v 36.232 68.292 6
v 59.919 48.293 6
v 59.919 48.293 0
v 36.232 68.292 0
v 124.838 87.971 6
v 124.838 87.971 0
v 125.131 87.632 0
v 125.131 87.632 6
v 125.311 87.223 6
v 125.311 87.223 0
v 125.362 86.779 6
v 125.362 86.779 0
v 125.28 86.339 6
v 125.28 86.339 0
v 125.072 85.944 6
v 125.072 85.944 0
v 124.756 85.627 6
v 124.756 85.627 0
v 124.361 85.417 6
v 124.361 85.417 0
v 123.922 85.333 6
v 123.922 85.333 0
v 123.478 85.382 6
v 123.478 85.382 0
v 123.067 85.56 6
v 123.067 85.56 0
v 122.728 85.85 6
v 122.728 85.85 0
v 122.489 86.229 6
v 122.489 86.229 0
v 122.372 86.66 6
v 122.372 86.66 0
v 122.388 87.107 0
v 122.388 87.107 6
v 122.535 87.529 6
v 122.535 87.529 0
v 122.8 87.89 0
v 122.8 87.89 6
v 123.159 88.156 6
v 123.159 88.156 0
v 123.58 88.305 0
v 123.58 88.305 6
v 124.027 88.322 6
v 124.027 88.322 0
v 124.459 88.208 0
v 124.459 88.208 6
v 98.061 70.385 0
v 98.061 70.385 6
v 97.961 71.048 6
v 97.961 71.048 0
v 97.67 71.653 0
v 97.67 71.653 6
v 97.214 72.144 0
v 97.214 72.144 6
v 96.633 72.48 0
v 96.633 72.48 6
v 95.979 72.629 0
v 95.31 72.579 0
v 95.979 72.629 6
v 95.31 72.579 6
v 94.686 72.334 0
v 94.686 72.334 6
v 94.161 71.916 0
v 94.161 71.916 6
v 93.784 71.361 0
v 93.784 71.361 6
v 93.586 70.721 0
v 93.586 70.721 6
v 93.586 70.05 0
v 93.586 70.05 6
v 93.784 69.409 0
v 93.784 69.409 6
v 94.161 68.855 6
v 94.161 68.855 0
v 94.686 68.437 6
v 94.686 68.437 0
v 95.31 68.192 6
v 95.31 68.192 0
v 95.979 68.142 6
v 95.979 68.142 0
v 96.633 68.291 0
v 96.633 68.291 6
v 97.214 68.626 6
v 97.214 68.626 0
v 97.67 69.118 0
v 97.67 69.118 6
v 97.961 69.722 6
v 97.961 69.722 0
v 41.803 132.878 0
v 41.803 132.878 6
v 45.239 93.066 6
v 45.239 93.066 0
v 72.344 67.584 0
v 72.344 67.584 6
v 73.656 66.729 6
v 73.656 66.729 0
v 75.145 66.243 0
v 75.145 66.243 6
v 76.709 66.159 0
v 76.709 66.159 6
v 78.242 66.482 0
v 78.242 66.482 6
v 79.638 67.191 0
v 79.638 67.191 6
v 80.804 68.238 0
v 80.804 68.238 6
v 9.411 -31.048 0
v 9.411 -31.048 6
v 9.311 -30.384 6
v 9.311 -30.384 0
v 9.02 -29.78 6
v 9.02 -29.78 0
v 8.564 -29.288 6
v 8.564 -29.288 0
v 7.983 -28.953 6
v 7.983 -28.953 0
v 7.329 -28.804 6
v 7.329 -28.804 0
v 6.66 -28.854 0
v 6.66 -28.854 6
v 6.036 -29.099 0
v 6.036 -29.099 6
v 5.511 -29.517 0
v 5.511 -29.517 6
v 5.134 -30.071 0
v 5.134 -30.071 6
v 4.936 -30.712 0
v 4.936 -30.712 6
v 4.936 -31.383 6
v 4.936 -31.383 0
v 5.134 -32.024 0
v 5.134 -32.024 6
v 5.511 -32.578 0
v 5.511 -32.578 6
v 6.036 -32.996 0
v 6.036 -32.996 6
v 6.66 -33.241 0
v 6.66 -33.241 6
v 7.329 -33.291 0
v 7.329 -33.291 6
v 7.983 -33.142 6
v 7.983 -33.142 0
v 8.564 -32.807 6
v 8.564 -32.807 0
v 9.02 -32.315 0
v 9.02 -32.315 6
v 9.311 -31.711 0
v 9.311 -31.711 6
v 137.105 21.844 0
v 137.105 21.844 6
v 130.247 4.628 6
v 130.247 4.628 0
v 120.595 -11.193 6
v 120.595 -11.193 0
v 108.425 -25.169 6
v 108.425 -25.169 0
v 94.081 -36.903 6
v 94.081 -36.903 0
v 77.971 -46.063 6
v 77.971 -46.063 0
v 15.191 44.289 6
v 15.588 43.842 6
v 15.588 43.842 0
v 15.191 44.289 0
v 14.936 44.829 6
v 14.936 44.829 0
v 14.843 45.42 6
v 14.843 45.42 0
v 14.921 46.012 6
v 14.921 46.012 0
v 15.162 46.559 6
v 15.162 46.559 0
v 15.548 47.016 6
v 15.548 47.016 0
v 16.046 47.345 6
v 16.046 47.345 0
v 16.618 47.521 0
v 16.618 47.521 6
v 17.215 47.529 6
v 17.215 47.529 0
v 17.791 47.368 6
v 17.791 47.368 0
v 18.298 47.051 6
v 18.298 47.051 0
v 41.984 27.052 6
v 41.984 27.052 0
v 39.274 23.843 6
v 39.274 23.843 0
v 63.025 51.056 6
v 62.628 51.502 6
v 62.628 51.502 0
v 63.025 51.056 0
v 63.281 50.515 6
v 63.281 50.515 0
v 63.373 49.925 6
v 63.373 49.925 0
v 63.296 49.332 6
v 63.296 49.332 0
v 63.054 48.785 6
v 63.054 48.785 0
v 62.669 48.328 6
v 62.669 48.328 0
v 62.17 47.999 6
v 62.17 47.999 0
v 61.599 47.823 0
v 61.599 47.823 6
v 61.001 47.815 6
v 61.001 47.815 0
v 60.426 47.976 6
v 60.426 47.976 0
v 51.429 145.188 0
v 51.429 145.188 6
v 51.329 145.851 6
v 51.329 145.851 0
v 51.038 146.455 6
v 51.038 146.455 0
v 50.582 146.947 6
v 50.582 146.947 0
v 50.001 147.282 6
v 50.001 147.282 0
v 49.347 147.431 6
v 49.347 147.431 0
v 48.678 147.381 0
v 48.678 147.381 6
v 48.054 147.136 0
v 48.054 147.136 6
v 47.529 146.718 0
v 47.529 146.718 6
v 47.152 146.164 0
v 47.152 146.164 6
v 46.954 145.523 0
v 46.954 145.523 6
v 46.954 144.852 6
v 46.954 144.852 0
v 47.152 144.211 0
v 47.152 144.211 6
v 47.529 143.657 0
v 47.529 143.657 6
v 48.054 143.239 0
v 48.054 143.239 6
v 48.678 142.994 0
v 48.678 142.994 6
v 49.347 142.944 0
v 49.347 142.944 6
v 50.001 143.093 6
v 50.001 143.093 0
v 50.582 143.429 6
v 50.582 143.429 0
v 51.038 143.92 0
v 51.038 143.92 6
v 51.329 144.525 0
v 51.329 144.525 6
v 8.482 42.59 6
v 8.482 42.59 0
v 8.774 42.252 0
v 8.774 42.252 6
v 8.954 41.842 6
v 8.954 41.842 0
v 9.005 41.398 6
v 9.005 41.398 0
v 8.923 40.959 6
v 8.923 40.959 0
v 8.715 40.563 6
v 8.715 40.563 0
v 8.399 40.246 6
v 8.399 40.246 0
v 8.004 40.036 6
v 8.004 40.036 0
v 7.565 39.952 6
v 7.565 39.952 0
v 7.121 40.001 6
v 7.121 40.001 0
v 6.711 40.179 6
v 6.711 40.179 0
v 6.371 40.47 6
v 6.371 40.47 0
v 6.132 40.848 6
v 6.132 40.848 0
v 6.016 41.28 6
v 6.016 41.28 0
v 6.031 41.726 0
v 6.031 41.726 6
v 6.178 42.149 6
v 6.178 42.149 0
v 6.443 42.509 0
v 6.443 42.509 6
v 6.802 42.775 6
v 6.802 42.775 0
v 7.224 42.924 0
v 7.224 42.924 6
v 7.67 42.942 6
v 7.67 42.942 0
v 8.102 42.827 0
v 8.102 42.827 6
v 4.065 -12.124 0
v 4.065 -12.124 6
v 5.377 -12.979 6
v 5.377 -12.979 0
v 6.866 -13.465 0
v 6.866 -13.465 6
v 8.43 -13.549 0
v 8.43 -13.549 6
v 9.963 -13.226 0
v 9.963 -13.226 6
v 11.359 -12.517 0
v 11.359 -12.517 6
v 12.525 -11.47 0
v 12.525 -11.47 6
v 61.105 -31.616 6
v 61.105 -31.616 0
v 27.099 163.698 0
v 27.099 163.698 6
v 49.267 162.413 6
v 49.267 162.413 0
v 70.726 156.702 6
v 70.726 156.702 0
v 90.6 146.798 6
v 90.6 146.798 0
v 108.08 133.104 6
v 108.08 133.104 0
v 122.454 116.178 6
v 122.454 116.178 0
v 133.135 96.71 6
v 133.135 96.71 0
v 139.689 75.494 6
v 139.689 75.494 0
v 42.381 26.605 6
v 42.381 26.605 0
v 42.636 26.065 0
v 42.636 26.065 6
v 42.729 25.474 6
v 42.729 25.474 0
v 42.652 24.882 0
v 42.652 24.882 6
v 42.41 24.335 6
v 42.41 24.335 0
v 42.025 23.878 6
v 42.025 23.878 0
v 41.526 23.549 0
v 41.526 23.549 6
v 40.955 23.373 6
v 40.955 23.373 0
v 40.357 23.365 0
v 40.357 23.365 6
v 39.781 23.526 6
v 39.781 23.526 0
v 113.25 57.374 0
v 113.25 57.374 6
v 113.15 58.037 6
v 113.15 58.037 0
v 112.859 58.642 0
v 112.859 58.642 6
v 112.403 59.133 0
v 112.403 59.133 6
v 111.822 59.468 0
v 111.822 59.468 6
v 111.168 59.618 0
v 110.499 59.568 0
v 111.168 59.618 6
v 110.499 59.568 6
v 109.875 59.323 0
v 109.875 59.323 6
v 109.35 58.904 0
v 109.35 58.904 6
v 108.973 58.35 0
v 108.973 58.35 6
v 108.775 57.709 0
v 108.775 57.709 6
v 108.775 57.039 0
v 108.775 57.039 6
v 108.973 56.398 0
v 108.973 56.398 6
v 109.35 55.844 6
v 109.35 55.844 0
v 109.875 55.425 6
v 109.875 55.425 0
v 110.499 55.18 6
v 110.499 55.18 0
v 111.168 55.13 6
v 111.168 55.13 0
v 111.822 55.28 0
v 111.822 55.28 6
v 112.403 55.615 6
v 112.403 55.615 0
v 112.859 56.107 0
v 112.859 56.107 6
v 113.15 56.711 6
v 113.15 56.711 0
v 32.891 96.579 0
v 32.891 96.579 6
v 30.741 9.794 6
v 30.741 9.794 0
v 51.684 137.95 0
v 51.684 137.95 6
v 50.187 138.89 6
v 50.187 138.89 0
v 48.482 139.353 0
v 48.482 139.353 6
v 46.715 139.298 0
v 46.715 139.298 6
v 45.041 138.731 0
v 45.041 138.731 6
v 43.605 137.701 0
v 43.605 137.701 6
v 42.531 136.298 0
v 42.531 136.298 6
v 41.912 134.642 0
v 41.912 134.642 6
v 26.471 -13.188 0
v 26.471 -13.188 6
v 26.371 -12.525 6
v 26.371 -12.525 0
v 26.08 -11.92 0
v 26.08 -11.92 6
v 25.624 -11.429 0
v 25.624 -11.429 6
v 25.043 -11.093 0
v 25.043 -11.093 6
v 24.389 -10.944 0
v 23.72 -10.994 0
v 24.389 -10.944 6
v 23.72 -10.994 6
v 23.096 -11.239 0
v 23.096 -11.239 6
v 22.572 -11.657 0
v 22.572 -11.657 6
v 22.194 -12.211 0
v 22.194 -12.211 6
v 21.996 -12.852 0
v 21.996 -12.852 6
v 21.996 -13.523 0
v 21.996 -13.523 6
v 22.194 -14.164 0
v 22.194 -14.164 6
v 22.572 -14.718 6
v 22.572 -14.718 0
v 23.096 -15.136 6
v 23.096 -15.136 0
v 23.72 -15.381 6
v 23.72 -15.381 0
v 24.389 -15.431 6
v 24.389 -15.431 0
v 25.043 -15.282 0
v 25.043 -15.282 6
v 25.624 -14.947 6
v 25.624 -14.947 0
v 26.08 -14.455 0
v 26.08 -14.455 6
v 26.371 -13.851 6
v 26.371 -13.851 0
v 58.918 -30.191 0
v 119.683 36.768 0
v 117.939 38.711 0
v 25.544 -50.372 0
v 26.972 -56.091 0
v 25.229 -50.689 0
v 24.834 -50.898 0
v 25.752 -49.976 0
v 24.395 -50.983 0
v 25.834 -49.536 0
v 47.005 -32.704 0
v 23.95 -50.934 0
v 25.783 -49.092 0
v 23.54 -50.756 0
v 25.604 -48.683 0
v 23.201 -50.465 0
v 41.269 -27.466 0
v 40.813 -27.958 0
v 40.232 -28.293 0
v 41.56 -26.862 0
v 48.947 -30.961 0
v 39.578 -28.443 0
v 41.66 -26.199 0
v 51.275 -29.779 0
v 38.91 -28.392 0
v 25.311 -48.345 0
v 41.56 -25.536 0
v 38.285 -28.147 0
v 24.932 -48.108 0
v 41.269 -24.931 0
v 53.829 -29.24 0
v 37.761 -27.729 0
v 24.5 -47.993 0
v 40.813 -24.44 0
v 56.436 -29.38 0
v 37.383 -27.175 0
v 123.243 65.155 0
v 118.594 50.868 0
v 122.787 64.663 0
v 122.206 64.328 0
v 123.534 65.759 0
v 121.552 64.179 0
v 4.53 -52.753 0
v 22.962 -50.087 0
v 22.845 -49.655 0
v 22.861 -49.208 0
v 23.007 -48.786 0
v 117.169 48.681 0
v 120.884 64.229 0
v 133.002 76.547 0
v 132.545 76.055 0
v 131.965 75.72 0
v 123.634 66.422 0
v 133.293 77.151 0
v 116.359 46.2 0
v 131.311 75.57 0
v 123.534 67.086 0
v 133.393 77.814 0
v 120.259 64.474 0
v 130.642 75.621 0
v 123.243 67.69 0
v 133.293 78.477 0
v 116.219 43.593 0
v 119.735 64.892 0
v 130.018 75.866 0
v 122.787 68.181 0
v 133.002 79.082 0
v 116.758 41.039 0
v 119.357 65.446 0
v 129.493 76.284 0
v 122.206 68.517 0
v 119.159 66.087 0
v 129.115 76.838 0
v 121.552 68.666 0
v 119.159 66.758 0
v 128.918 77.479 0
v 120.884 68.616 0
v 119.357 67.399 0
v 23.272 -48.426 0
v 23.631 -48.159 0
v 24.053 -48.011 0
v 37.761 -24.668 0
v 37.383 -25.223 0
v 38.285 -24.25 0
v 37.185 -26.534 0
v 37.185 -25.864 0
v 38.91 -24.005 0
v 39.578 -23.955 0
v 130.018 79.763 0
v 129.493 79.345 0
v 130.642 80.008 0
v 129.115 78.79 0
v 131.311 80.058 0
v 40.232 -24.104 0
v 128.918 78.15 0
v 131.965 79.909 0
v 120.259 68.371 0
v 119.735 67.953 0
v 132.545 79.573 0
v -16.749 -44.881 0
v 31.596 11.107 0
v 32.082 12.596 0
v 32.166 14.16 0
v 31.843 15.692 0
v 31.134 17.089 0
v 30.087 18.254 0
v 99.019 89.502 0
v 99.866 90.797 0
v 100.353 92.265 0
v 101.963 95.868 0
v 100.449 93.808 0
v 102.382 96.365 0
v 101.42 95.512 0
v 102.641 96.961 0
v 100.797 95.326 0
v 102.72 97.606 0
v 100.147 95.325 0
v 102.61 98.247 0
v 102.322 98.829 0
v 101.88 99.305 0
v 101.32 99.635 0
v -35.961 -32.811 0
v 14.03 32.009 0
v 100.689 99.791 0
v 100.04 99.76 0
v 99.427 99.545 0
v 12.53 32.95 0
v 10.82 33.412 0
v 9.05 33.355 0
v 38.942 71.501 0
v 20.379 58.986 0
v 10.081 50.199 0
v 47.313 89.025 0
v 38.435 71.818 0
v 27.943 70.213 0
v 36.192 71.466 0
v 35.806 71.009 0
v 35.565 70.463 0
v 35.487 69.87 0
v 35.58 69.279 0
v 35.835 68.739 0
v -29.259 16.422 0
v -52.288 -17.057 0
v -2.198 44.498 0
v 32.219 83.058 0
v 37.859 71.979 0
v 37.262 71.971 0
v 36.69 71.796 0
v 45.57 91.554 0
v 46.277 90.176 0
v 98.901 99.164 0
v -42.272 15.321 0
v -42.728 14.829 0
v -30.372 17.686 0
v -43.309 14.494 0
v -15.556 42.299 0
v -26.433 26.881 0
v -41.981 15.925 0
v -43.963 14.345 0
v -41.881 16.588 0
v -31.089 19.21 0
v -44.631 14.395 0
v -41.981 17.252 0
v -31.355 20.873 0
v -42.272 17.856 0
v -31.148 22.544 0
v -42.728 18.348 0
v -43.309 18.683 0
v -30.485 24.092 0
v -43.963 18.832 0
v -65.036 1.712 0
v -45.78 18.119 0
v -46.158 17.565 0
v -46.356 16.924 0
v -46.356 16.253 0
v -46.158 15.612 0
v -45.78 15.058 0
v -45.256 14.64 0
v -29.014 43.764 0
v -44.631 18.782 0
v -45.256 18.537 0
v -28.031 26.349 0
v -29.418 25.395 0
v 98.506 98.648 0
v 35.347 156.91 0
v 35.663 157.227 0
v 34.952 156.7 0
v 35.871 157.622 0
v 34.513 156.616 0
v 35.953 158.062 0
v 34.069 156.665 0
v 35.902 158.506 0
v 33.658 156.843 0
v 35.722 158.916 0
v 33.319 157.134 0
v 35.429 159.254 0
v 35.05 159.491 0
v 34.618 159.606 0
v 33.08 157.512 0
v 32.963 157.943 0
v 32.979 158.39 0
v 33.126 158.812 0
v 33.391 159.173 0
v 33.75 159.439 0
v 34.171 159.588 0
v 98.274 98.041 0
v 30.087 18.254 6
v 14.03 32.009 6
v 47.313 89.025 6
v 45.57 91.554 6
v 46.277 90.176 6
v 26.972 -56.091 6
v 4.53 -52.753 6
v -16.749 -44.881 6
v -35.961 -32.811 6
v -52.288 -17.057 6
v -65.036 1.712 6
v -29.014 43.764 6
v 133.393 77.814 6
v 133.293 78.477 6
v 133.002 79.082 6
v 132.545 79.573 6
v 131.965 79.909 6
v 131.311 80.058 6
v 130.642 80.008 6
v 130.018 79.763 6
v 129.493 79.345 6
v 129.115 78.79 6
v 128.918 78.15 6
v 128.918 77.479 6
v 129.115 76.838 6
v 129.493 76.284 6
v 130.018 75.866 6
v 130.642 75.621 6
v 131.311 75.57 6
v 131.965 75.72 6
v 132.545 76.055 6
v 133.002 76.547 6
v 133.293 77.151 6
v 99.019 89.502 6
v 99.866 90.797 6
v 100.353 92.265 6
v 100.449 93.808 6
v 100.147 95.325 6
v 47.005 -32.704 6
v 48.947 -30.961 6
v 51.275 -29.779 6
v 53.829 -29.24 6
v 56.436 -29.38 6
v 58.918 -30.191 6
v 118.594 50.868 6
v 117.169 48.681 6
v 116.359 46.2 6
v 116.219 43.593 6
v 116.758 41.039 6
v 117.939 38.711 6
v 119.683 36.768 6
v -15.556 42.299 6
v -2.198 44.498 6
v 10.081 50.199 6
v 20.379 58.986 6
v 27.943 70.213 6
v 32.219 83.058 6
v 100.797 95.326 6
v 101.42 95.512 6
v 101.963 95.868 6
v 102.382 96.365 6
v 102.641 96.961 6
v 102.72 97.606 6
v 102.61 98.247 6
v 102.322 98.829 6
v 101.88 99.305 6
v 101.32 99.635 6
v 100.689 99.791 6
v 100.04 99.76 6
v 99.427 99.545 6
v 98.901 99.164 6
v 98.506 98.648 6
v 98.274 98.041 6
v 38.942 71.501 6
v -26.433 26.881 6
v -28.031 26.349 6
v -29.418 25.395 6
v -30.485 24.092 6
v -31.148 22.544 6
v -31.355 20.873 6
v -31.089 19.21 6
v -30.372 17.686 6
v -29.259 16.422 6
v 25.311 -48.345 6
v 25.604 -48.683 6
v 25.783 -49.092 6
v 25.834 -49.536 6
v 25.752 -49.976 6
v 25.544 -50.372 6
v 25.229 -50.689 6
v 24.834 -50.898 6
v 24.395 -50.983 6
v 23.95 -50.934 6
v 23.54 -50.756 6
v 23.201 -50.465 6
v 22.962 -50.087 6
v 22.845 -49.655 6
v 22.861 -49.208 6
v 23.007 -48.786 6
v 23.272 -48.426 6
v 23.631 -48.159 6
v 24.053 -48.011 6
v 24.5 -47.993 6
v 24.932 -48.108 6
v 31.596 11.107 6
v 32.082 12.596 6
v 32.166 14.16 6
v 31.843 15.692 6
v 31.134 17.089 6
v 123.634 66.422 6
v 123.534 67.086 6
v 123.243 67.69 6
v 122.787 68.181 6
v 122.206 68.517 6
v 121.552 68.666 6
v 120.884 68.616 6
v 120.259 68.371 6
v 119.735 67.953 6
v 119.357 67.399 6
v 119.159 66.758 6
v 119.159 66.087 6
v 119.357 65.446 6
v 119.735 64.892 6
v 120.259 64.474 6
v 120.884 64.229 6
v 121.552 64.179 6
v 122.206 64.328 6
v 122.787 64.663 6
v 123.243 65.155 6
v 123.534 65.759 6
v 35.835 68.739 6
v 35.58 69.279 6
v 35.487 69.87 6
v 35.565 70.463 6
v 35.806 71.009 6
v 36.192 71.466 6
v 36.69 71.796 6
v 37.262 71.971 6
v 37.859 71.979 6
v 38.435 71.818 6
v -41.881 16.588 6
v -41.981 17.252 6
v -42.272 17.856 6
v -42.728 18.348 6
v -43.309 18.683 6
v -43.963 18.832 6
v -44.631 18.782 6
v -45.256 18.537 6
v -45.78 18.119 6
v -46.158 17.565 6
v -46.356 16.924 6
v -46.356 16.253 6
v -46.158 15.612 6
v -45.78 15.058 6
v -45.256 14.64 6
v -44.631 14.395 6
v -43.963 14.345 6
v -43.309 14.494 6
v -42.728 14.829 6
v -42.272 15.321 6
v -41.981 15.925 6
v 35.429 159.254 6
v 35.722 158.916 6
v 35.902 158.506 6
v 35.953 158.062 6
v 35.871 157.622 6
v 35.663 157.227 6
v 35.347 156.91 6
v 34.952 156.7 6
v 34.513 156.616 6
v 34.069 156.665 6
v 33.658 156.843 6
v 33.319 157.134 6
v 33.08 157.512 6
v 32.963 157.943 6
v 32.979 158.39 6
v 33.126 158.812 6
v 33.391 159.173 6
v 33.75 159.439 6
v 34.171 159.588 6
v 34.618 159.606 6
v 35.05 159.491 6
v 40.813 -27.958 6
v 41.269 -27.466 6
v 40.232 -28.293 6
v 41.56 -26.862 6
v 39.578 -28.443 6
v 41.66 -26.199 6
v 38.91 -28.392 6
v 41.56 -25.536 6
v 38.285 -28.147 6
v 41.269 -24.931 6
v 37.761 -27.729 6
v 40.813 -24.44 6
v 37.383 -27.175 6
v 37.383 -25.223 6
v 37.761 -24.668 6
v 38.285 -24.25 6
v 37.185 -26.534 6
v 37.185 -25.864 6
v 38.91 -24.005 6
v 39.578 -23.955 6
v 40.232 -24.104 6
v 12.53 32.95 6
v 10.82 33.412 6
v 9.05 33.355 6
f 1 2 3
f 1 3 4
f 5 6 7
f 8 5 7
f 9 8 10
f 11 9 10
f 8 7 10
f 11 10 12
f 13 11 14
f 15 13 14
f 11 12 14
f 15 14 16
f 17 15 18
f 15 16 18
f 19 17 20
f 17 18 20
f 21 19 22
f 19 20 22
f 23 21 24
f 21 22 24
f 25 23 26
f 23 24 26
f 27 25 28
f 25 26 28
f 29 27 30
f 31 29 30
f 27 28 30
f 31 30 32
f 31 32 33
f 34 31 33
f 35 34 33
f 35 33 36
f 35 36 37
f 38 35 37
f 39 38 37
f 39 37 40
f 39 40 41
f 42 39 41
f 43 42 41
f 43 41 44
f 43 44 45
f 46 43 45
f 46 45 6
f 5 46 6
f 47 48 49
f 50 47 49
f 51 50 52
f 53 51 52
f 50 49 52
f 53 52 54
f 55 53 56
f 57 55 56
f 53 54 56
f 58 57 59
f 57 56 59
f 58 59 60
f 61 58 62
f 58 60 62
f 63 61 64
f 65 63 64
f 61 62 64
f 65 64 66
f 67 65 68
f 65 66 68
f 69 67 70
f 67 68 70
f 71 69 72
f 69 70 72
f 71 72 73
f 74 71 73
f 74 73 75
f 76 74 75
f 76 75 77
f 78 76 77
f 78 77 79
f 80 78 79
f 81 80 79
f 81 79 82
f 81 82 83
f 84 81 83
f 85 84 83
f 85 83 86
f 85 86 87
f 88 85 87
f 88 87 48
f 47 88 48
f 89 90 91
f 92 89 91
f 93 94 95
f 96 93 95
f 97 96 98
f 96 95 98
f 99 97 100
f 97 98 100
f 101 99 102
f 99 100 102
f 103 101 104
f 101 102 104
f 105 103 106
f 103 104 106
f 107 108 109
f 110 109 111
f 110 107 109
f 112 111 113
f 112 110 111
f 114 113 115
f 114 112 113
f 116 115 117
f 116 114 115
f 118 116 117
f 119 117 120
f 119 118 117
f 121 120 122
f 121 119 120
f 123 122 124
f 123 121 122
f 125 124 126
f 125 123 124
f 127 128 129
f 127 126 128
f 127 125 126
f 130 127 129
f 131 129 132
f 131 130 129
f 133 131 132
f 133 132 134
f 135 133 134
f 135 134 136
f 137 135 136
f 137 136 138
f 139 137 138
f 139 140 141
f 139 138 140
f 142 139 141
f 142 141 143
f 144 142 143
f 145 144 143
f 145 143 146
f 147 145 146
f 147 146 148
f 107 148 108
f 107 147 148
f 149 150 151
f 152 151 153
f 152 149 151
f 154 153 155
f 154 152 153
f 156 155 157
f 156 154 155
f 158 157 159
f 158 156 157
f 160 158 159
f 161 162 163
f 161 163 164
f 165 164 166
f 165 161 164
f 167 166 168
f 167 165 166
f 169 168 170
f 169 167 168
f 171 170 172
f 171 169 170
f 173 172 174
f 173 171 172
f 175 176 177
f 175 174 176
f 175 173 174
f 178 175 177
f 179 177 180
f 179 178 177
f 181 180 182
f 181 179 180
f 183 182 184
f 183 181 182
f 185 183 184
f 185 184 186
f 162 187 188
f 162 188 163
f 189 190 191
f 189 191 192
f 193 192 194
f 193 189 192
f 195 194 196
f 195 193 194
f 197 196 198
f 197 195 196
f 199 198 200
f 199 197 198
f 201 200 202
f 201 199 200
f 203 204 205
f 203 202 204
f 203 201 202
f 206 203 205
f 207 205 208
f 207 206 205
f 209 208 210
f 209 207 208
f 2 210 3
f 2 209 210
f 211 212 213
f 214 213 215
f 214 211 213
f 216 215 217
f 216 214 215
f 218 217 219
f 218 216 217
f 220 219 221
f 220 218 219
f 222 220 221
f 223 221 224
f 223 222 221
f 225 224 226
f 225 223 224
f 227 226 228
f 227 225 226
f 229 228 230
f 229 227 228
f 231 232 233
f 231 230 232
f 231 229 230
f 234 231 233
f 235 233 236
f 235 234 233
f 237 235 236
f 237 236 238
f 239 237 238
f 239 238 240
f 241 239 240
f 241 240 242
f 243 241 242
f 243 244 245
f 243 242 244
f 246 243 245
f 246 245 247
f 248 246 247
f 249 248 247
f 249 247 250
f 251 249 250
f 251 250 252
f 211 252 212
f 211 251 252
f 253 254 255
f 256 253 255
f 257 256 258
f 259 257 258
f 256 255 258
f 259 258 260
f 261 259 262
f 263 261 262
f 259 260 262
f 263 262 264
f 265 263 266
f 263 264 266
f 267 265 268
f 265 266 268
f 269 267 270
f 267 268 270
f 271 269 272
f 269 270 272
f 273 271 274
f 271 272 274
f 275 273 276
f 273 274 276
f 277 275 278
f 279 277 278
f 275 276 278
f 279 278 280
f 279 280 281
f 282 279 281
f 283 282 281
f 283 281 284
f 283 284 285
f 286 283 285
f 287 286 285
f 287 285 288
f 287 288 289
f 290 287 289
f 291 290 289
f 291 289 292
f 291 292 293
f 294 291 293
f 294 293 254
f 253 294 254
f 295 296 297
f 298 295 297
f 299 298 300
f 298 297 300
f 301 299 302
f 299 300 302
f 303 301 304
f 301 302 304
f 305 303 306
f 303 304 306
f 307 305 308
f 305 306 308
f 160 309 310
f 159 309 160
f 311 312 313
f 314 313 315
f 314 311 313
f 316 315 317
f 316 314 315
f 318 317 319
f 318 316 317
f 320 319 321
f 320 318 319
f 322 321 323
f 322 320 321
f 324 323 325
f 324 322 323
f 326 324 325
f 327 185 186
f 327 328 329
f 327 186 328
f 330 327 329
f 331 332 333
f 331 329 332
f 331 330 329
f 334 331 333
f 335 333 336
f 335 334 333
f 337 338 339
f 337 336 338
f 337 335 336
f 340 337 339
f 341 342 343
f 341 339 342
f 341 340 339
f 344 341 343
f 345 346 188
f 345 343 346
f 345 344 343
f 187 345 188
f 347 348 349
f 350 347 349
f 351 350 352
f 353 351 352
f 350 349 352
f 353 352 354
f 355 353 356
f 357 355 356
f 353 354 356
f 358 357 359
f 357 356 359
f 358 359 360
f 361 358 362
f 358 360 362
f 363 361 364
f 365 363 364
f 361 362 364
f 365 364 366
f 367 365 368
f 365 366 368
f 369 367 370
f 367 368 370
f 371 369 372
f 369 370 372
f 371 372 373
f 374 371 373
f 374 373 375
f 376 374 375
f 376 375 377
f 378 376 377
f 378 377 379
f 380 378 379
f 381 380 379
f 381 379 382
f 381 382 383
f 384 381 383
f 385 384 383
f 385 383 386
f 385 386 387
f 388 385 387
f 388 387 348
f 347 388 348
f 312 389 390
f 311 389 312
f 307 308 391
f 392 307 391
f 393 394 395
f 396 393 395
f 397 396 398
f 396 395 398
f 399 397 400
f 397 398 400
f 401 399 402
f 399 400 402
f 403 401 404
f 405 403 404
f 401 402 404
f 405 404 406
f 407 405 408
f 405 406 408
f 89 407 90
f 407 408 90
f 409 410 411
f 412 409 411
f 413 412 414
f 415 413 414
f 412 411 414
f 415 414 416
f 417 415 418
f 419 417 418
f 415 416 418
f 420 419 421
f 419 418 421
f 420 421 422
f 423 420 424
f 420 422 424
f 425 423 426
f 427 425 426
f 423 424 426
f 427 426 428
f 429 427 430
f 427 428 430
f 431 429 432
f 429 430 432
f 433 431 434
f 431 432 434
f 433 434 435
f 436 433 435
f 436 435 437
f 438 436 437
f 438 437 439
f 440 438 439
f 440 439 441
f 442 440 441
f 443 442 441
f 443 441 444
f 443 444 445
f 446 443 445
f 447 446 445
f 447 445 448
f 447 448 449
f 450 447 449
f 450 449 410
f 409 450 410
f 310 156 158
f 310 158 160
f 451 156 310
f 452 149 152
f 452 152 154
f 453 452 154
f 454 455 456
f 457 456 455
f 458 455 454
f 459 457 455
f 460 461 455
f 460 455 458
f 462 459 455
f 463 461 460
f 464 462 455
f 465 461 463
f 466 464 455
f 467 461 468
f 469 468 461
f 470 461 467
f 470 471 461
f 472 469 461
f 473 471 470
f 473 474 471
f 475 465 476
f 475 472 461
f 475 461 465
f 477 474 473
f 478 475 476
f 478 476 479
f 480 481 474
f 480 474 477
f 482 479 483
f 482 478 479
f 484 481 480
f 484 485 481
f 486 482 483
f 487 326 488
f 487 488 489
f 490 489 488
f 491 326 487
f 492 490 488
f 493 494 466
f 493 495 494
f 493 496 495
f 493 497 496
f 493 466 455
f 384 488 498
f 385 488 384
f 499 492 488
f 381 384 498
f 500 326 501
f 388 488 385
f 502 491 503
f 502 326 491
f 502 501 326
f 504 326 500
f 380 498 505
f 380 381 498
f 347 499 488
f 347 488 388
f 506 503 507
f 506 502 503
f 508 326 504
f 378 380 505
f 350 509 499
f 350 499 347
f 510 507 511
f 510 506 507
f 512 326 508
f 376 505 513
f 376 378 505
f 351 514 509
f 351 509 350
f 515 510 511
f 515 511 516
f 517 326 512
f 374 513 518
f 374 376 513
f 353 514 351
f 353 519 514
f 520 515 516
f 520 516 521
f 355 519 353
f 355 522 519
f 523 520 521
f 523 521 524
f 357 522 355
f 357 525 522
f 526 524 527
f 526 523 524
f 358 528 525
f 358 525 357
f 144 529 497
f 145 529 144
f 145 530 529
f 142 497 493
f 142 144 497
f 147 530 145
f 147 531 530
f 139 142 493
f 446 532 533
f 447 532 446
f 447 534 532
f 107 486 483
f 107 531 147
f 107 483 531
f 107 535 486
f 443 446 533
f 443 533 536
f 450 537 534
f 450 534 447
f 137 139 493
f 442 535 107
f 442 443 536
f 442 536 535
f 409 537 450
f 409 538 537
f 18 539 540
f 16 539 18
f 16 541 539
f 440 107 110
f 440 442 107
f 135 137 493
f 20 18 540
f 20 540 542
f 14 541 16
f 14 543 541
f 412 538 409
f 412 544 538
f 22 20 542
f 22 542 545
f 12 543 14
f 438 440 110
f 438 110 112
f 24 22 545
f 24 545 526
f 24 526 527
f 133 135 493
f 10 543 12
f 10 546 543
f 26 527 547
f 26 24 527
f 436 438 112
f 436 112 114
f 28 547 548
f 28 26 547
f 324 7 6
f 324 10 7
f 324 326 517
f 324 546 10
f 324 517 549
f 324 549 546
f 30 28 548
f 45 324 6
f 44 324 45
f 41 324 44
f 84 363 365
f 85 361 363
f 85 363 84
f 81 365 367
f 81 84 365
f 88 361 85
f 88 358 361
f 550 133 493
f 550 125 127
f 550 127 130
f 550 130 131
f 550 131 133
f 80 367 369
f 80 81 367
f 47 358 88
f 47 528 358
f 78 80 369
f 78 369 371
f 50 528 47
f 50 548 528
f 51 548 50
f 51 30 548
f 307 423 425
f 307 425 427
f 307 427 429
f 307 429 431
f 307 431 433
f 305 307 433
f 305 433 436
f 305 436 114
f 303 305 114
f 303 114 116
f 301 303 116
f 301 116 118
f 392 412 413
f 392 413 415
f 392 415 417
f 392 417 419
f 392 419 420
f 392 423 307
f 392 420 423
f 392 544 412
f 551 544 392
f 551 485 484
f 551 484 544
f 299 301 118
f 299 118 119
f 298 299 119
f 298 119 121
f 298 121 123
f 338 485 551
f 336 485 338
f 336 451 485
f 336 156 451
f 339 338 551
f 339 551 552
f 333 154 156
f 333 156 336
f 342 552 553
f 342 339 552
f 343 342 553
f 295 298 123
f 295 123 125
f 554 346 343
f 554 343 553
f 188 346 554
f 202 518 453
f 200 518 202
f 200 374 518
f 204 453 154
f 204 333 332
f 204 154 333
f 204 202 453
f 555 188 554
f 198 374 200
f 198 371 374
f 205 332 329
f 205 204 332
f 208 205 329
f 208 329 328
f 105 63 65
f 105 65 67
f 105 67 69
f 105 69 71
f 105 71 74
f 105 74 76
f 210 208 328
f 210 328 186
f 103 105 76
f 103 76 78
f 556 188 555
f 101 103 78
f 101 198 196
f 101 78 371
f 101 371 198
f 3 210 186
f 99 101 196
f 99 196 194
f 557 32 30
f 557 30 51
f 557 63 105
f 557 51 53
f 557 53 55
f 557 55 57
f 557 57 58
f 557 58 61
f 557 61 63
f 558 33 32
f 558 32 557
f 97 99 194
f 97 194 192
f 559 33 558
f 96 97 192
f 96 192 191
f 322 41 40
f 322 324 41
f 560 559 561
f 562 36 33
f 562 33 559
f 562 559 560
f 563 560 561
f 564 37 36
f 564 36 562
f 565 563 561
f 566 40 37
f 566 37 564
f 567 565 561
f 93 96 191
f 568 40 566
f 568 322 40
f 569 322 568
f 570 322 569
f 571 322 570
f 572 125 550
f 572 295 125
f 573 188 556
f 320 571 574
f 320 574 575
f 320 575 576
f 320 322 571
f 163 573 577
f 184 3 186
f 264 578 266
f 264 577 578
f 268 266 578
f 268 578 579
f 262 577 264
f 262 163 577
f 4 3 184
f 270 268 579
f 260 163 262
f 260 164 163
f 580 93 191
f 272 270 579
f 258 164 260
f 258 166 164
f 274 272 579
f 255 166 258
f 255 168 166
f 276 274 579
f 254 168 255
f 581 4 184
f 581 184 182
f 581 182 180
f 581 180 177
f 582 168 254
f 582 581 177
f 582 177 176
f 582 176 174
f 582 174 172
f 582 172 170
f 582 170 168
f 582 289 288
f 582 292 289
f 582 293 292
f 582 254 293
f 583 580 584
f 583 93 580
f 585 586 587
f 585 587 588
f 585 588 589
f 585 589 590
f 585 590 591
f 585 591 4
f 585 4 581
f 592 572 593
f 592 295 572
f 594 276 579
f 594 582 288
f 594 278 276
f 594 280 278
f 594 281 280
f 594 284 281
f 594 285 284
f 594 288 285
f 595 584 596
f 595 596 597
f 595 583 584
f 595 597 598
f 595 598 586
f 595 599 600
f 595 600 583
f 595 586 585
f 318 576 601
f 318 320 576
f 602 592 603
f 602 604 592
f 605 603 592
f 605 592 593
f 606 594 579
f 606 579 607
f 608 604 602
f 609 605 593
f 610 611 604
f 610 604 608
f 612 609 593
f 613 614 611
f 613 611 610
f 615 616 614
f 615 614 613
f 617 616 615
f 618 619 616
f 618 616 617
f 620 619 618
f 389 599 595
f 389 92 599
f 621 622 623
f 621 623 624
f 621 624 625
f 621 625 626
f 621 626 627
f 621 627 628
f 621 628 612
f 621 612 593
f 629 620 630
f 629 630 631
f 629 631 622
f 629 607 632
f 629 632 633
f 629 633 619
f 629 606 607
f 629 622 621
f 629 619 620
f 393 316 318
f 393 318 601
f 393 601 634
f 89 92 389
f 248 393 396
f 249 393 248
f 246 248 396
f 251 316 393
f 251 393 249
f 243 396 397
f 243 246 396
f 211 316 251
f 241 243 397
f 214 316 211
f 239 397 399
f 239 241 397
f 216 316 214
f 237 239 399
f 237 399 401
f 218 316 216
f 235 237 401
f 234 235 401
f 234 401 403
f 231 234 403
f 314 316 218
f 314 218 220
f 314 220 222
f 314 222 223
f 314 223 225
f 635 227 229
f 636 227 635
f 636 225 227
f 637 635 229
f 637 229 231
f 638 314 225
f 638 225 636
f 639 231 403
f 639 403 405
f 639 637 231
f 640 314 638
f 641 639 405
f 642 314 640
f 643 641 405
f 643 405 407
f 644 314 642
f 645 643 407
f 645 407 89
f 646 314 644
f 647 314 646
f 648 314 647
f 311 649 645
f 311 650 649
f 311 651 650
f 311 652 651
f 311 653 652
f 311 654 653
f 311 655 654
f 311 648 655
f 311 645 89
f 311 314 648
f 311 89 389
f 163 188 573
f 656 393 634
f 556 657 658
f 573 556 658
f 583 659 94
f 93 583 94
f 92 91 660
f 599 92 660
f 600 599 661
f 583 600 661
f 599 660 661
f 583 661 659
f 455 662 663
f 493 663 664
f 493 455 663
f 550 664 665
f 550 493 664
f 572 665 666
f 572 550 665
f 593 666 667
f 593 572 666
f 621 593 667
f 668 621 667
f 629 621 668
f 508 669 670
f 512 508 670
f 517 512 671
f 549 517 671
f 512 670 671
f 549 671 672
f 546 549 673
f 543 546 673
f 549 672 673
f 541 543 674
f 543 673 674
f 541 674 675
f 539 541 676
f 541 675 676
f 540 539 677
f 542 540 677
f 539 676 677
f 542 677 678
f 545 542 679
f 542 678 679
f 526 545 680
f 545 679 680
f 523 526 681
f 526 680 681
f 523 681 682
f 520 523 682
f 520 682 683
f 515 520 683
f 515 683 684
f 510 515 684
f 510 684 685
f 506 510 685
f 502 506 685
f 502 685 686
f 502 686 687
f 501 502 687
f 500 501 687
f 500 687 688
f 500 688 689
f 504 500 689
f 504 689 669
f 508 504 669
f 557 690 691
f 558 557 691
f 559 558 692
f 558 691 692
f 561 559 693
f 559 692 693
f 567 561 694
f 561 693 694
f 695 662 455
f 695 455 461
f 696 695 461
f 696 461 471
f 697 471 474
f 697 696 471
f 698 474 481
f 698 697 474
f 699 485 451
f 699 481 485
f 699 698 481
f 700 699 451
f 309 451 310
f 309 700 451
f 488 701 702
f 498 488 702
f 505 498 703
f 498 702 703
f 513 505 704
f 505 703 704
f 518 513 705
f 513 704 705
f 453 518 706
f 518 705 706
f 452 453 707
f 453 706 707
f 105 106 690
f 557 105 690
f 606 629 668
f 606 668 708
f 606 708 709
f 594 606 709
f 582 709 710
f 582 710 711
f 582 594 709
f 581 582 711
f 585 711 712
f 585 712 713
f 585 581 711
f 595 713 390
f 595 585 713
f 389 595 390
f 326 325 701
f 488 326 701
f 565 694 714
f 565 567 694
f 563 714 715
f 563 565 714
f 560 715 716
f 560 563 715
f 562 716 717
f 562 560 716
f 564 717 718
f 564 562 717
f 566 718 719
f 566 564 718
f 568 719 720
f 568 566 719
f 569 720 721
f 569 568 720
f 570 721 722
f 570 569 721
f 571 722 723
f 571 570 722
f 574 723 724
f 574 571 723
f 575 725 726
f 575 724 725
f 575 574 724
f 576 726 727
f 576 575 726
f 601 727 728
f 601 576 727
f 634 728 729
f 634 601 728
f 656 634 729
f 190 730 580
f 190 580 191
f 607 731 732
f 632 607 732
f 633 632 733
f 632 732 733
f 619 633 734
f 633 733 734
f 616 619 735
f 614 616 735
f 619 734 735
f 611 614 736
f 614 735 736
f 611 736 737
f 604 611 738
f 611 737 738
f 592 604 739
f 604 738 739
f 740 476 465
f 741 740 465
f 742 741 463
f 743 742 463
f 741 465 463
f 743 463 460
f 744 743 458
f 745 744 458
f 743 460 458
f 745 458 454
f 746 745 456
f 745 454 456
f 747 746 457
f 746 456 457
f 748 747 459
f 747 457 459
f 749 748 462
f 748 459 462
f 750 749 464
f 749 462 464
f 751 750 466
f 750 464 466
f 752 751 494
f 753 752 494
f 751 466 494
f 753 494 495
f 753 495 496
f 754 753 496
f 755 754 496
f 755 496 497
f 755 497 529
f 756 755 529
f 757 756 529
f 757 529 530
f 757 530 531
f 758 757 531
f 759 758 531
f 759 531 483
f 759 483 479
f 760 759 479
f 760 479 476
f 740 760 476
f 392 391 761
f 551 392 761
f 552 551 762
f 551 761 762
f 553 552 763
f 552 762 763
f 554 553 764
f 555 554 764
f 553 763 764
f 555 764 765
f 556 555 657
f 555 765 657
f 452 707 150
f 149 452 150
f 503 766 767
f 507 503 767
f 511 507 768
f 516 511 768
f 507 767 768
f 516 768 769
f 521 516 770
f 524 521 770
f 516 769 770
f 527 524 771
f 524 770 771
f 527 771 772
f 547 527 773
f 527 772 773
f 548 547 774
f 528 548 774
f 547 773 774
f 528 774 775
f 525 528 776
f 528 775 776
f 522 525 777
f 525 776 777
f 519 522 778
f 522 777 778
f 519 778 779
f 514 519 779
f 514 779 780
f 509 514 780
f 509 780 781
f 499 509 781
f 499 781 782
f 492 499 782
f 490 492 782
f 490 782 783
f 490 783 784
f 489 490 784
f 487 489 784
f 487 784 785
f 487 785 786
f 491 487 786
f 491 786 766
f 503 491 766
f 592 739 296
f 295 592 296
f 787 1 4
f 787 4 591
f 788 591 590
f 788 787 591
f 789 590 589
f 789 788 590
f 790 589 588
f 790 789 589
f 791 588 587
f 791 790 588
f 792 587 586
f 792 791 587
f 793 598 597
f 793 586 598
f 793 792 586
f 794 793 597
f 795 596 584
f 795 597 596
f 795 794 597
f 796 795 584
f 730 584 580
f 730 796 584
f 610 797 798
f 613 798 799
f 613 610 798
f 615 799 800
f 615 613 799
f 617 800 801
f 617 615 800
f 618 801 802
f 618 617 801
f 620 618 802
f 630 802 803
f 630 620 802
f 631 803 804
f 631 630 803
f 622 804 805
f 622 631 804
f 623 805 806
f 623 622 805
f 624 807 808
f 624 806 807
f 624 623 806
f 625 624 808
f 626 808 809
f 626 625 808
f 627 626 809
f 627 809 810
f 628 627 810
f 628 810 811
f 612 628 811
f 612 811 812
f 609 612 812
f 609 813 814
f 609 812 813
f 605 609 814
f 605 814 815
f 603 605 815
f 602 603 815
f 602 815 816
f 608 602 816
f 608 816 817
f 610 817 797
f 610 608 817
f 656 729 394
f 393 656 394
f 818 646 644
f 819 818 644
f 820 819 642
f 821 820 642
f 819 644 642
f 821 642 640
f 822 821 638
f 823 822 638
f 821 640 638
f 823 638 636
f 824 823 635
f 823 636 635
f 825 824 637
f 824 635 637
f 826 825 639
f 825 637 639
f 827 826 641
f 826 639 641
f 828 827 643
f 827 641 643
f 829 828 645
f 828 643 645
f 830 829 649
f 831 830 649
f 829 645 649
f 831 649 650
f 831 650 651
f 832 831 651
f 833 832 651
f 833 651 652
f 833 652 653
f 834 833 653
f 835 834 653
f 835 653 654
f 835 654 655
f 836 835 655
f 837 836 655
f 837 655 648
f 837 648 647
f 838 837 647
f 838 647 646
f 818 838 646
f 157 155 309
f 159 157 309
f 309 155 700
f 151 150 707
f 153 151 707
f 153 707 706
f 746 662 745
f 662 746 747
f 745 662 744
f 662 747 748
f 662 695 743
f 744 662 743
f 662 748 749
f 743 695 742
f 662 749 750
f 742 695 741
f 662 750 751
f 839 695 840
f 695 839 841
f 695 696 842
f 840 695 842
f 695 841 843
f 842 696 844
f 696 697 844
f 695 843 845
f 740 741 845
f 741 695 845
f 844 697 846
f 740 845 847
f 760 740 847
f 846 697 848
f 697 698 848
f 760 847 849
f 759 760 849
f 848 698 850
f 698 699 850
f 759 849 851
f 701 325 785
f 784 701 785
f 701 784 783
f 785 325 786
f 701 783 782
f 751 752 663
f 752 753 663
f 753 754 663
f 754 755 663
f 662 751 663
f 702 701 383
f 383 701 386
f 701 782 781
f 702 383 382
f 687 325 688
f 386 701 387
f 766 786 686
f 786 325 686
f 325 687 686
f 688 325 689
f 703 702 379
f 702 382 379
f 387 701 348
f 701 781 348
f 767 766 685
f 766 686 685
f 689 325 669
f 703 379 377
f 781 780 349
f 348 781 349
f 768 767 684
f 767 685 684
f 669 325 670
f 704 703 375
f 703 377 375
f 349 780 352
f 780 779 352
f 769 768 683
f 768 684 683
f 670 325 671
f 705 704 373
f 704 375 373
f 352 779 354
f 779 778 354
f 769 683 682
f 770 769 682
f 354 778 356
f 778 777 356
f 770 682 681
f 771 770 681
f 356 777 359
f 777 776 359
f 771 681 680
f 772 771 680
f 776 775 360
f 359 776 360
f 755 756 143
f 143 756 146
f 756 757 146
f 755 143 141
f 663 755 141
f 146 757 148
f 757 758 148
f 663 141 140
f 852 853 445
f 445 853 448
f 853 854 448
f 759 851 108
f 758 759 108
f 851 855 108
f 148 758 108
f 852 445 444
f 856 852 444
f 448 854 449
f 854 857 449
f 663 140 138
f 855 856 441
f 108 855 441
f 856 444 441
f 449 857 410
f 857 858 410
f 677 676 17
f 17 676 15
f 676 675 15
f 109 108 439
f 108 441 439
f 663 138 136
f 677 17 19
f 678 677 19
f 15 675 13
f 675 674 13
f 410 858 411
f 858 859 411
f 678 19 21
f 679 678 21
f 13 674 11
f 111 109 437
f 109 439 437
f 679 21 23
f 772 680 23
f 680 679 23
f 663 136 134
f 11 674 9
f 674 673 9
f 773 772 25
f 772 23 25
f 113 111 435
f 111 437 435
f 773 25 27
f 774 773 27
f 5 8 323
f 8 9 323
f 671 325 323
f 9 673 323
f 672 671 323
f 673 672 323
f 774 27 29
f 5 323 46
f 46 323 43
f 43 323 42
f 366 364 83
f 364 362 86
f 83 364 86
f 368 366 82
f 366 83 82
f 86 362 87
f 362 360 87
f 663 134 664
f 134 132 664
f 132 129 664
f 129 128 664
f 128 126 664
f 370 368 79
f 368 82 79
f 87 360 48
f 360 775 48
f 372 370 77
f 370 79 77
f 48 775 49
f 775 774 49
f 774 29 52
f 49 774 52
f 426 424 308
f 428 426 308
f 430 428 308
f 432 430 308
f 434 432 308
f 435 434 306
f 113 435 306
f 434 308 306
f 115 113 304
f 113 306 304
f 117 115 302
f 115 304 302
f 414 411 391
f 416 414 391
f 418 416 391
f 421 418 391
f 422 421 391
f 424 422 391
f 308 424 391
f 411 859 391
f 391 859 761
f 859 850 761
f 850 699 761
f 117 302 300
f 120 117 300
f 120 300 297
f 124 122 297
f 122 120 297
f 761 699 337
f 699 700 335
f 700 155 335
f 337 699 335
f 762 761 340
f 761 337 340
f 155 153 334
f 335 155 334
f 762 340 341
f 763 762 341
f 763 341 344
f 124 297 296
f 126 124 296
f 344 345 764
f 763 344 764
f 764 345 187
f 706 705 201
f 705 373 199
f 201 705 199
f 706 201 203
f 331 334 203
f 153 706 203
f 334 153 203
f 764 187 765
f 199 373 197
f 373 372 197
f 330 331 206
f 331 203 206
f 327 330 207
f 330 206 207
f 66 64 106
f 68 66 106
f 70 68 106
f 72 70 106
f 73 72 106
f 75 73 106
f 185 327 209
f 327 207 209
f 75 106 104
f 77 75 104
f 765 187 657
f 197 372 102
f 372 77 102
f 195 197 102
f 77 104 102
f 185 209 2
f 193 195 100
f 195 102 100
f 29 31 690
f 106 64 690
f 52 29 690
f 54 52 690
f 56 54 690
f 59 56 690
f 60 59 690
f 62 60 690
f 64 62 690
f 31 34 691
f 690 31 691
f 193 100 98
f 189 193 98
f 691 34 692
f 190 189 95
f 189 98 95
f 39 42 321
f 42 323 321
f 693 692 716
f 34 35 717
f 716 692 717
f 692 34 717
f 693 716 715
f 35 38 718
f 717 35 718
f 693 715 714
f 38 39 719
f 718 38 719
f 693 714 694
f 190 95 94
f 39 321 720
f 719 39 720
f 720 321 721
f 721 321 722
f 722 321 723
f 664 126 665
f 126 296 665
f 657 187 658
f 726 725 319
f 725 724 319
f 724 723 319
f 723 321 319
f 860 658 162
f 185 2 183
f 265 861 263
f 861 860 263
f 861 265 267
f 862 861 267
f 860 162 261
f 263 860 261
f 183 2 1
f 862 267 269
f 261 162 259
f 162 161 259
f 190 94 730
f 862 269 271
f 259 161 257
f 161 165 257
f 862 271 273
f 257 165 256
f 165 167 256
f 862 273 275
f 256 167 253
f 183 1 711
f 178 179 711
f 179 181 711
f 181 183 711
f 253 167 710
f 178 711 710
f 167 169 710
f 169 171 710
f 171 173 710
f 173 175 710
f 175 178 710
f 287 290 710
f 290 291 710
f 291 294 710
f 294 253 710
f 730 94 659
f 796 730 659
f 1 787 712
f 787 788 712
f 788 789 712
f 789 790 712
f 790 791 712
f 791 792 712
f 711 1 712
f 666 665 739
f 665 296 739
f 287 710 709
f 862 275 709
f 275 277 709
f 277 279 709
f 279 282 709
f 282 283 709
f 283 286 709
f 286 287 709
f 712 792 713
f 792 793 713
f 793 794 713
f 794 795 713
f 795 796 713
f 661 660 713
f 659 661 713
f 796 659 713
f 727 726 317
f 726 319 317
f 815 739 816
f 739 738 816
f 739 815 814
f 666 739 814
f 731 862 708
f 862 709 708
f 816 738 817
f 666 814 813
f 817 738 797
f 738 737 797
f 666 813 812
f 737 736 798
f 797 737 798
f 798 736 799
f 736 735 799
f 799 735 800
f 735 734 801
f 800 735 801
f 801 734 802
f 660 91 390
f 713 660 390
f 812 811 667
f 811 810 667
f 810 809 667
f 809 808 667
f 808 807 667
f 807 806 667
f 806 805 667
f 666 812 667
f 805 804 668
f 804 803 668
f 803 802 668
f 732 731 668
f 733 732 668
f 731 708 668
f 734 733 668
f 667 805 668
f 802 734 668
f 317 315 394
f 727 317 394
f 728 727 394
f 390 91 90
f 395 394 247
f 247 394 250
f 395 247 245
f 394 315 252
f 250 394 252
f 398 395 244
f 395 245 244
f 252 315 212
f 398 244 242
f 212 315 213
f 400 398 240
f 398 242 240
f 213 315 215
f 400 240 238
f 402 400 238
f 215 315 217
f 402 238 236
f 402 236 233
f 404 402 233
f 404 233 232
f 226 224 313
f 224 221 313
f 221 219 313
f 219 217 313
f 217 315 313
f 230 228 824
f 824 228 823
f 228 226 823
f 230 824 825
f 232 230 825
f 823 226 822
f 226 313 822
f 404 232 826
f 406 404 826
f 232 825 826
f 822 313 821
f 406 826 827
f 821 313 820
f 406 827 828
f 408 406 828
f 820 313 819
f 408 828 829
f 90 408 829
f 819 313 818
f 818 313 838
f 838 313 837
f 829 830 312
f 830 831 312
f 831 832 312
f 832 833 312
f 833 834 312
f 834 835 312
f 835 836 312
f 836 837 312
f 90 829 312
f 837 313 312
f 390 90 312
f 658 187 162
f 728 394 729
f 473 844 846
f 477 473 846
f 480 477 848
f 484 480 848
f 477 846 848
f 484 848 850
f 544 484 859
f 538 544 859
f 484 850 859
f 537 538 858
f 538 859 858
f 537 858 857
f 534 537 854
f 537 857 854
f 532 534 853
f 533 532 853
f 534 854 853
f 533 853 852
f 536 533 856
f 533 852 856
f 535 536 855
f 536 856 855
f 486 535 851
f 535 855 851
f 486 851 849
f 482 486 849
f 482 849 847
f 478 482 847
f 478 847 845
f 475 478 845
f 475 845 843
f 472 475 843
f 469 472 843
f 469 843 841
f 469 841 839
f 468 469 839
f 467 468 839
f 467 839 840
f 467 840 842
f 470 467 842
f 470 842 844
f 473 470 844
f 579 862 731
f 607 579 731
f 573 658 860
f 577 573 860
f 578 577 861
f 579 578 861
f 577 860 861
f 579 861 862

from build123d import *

# Parameters (mm, degrees)
SKETCH1_R                     = 2.25
BOSS_EXTRUDE1_DEPTH           = 6
CUT_EXTRUDE1_DEPTH            = 10
F_4_5_4_5_DIAMETER_HOLE_D     = 4.5
F_4_5_4_5_DIAMETER_HOLE_DEPTH = 10
F_4_5_4_5_DIAMETER_HOLE_TIP   = 1.351936393
F_3_0MM_DOWEL_HOLE1_D         = 3
SKETCH7_R                     = 2.25
CUT_EXTRUDE2_DEPTH            = 10


with BuildPart() as part:
    # Sketch1 → Boss-Extrude1 (new body)
    with BuildSketch(Plane.XY):
        with BuildLine():
            Line((-65.035663909, 1.711915541), (-29.013741643, 43.763540838))
            ThreePointArc((-29.013741643, 43.763540838), (15.528638553, 54.242344325), (32.891210702, 96.578735816))
            Line((32.891210702, 96.578735816), (27.09893981, 163.698257544))
            ThreePointArc((27.09893981, 163.698257544), (127.465162664, -0.583384595), (-65.035663909, 1.711915541))
        make_face()
        with Locations((-44.130722543, 16.588386381)):
            Circle(SKETCH1_R, mode=Mode.SUBTRACT)
        with Locations((7.160790579, -31.047531597)):
            Circle(SKETCH1_R, mode=Mode.SUBTRACT)
        with Locations((100.470270724, 97.551800763)):
            Circle(SKETCH1_R, mode=Mode.SUBTRACT)
        with Locations((49.178757602, 145.187718741)):
            Circle(SKETCH1_R, mode=Mode.SUBTRACT)
    extrude(amount=BOSS_EXTRUDE1_DEPTH)

    # Sketch2 → Cut-Extrude1 (cut)
    with BuildSketch(Plane.XY.offset(6)):
        with BuildLine():
            Line((59.918631336, 48.293162369), (36.232435894, 68.292265986))
            ThreePointArc((36.232435894, 68.292265986), (35.982665158, 71.251592696), (38.941991868, 71.501363433))
            Line((38.941991868, 71.501363433), (62.62818731, 51.502259816))
            ThreePointArc((62.62818731, 51.502259816), (62.877958047, 48.542933105), (59.918631336, 48.293162369))
        make_face()
        with BuildLine():
            Line((39.274395345, 23.842896106), (15.588199903, 43.841999723))
            ThreePointArc((15.588199903, 43.841999723), (15.338429166, 46.801326433), (18.297755877, 47.05109717))
            Line((18.297755877, 47.05109717), (41.983951319, 27.051993553))
            ThreePointArc((41.983951319, 27.051993553), (42.233722055, 24.092666842), (39.274395345, 23.842896106))
        make_face()
    extrude(amount=-CUT_EXTRUDE1_DEPTH, mode=Mode.SUBTRACT)

    # Ø4.5 (4.5) Diameter Hole
    with Locations(Plane(origin=(207.215806152, -96.41995806, 6), x_dir=(-0.650558884, -0.759455817, 0), z_dir=(0, 0, 1))):
        with Locations((80.500098125, -194.461558154), (77.690872648, -264.405165812), (-80.677949684, -277.202176468), (-77.868724207, -207.25856881)):
            Hole(F_4_5_4_5_DIAMETER_HOLE_D / 2, depth=F_4_5_4_5_DIAMETER_HOLE_DEPTH)
            with Locations((0, 0, -(F_4_5_4_5_DIAMETER_HOLE_DEPTH + F_4_5_4_5_DIAMETER_HOLE_TIP / 2))):  # 118° drill point
                Cone(0, F_4_5_4_5_DIAMETER_HOLE_D / 2, F_4_5_4_5_DIAMETER_HOLE_TIP, mode=Mode.SUBTRACT)

    # Ø3.0mm Dowel Hole1 (through all)
    with Locations(Plane(origin=(207.215806152, -96.41995806, 6), x_dir=(-0.650558884, -0.759455817, 0), z_dir=(0, 0, 1))):
        with Locations((-80.915811264, -296.794954316), (-84.945199209, -182.518931257), (25.216324899, -241.36407945), (83.328606401, -169.42446636)):
            Hole(F_3_0MM_DOWEL_HOLE1_D / 2)

    # Sketch7 → Cut-Extrude2 (cut)
    with BuildSketch(Plane.XY.offset(6)):
        with Locations((39.410270698, -26.198883172)):
            Circle(SKETCH7_R)
        with Locations((110.999824953, 57.374033532)):
            Circle(SKETCH7_R)
        with Locations((24.221154353, -13.187705491)):
            Circle(SKETCH7_R)
        with Locations((95.810708608, 70.385211214)):
            Circle(SKETCH7_R)
        with Locations((121.384198104, 66.422365269)):
            Circle(SKETCH7_R)
        with Locations((131.142581365, 77.814202528)):
            Circle(SKETCH7_R)
        with BuildLine():
            Line((41.803278926, 132.877815745), (45.238927964, 93.066293708))
            ThreePointArc((45.238927964, 93.066293708), (45.878980474, 90.841973124), (47.31335672, 89.025428586))
            Line((47.31335672, 89.025428586), (72.343619279, 67.584208031))
            ThreePointArc((72.343619279, 67.584208031), (76.708983142, 66.158757194), (80.803707486, 68.23758963))
            Line((80.803707486, 68.23758963), (99.019356241, 89.502352513))
            ThreePointArc((99.019356241, 89.502352513), (100.444807079, 93.867716376), (98.365974642, 97.962440721))
            Line((98.365974642, 97.962440721), (51.684414291, 137.95042043))
            ThreePointArc((51.684414291, 137.95042043), (45.040870621, 138.731415078), (41.803278926, 132.877815745))
        make_face()
        with BuildLine():
            Line((139.689194778, 75.494313025), (118.594383125, 50.868444691))
            ThreePointArc((118.594383125, 50.868444691), (116.218631729, 43.592838252), (119.683352457, 36.768297678))
            Line((119.683352457, 36.768297678), (137.105326674, 21.84442739))
            Line((137.105326674, 21.84442739), (157.179168696, 45.278426173))
            Line((157.179168696, 45.278426173), (139.689194778, 75.494313025))
        make_face()
        with BuildLine():
            Line((26.971727927, -56.090910074), (47.00482887, -32.704472013))
            ThreePointArc((47.00482887, -32.704472013), (53.829369443, -29.239751286), (61.104975883, -31.615502682))
            Line((61.104975883, -31.615502682), (77.970944185, -46.063091691))
            Line((77.970944185, -46.063091691), (19.420644617, -114.414115242))
            Line((19.420644617, -114.414115242), (26.971727927, -56.090910074))
        make_face()
        with BuildLine():
            Line((30.087133776, 18.254417116), (14.029920526, 32.00921693))
            ThreePointArc((14.029920526, 32.00921693), (11.691810194, 33.244719456), (9.049641571, 33.355043432))
            Line((9.049641571, 33.355043432), (-26.432830213, 26.881246485))
            ThreePointArc((-26.432830213, 26.881246485), (-31.148141992, 22.543928053), (-29.259257867, 16.421950176))
            Line((-29.259257867, 16.421950176), (4.064778412, -12.123815573))
            ThreePointArc((4.064778412, -12.123815573), (8.430142276, -13.549266411), (12.52486662, -11.470433974))
            Line((12.52486662, -11.470433974), (30.740515375, 9.794328908))
            ThreePointArc((30.740515375, 9.794328908), (32.165966213, 14.159692772), (30.087133776, 18.254417116))
        make_face()
    extrude(amount=-CUT_EXTRUDE2_DEPTH, mode=Mode.SUBTRACT)


solid = part.part
